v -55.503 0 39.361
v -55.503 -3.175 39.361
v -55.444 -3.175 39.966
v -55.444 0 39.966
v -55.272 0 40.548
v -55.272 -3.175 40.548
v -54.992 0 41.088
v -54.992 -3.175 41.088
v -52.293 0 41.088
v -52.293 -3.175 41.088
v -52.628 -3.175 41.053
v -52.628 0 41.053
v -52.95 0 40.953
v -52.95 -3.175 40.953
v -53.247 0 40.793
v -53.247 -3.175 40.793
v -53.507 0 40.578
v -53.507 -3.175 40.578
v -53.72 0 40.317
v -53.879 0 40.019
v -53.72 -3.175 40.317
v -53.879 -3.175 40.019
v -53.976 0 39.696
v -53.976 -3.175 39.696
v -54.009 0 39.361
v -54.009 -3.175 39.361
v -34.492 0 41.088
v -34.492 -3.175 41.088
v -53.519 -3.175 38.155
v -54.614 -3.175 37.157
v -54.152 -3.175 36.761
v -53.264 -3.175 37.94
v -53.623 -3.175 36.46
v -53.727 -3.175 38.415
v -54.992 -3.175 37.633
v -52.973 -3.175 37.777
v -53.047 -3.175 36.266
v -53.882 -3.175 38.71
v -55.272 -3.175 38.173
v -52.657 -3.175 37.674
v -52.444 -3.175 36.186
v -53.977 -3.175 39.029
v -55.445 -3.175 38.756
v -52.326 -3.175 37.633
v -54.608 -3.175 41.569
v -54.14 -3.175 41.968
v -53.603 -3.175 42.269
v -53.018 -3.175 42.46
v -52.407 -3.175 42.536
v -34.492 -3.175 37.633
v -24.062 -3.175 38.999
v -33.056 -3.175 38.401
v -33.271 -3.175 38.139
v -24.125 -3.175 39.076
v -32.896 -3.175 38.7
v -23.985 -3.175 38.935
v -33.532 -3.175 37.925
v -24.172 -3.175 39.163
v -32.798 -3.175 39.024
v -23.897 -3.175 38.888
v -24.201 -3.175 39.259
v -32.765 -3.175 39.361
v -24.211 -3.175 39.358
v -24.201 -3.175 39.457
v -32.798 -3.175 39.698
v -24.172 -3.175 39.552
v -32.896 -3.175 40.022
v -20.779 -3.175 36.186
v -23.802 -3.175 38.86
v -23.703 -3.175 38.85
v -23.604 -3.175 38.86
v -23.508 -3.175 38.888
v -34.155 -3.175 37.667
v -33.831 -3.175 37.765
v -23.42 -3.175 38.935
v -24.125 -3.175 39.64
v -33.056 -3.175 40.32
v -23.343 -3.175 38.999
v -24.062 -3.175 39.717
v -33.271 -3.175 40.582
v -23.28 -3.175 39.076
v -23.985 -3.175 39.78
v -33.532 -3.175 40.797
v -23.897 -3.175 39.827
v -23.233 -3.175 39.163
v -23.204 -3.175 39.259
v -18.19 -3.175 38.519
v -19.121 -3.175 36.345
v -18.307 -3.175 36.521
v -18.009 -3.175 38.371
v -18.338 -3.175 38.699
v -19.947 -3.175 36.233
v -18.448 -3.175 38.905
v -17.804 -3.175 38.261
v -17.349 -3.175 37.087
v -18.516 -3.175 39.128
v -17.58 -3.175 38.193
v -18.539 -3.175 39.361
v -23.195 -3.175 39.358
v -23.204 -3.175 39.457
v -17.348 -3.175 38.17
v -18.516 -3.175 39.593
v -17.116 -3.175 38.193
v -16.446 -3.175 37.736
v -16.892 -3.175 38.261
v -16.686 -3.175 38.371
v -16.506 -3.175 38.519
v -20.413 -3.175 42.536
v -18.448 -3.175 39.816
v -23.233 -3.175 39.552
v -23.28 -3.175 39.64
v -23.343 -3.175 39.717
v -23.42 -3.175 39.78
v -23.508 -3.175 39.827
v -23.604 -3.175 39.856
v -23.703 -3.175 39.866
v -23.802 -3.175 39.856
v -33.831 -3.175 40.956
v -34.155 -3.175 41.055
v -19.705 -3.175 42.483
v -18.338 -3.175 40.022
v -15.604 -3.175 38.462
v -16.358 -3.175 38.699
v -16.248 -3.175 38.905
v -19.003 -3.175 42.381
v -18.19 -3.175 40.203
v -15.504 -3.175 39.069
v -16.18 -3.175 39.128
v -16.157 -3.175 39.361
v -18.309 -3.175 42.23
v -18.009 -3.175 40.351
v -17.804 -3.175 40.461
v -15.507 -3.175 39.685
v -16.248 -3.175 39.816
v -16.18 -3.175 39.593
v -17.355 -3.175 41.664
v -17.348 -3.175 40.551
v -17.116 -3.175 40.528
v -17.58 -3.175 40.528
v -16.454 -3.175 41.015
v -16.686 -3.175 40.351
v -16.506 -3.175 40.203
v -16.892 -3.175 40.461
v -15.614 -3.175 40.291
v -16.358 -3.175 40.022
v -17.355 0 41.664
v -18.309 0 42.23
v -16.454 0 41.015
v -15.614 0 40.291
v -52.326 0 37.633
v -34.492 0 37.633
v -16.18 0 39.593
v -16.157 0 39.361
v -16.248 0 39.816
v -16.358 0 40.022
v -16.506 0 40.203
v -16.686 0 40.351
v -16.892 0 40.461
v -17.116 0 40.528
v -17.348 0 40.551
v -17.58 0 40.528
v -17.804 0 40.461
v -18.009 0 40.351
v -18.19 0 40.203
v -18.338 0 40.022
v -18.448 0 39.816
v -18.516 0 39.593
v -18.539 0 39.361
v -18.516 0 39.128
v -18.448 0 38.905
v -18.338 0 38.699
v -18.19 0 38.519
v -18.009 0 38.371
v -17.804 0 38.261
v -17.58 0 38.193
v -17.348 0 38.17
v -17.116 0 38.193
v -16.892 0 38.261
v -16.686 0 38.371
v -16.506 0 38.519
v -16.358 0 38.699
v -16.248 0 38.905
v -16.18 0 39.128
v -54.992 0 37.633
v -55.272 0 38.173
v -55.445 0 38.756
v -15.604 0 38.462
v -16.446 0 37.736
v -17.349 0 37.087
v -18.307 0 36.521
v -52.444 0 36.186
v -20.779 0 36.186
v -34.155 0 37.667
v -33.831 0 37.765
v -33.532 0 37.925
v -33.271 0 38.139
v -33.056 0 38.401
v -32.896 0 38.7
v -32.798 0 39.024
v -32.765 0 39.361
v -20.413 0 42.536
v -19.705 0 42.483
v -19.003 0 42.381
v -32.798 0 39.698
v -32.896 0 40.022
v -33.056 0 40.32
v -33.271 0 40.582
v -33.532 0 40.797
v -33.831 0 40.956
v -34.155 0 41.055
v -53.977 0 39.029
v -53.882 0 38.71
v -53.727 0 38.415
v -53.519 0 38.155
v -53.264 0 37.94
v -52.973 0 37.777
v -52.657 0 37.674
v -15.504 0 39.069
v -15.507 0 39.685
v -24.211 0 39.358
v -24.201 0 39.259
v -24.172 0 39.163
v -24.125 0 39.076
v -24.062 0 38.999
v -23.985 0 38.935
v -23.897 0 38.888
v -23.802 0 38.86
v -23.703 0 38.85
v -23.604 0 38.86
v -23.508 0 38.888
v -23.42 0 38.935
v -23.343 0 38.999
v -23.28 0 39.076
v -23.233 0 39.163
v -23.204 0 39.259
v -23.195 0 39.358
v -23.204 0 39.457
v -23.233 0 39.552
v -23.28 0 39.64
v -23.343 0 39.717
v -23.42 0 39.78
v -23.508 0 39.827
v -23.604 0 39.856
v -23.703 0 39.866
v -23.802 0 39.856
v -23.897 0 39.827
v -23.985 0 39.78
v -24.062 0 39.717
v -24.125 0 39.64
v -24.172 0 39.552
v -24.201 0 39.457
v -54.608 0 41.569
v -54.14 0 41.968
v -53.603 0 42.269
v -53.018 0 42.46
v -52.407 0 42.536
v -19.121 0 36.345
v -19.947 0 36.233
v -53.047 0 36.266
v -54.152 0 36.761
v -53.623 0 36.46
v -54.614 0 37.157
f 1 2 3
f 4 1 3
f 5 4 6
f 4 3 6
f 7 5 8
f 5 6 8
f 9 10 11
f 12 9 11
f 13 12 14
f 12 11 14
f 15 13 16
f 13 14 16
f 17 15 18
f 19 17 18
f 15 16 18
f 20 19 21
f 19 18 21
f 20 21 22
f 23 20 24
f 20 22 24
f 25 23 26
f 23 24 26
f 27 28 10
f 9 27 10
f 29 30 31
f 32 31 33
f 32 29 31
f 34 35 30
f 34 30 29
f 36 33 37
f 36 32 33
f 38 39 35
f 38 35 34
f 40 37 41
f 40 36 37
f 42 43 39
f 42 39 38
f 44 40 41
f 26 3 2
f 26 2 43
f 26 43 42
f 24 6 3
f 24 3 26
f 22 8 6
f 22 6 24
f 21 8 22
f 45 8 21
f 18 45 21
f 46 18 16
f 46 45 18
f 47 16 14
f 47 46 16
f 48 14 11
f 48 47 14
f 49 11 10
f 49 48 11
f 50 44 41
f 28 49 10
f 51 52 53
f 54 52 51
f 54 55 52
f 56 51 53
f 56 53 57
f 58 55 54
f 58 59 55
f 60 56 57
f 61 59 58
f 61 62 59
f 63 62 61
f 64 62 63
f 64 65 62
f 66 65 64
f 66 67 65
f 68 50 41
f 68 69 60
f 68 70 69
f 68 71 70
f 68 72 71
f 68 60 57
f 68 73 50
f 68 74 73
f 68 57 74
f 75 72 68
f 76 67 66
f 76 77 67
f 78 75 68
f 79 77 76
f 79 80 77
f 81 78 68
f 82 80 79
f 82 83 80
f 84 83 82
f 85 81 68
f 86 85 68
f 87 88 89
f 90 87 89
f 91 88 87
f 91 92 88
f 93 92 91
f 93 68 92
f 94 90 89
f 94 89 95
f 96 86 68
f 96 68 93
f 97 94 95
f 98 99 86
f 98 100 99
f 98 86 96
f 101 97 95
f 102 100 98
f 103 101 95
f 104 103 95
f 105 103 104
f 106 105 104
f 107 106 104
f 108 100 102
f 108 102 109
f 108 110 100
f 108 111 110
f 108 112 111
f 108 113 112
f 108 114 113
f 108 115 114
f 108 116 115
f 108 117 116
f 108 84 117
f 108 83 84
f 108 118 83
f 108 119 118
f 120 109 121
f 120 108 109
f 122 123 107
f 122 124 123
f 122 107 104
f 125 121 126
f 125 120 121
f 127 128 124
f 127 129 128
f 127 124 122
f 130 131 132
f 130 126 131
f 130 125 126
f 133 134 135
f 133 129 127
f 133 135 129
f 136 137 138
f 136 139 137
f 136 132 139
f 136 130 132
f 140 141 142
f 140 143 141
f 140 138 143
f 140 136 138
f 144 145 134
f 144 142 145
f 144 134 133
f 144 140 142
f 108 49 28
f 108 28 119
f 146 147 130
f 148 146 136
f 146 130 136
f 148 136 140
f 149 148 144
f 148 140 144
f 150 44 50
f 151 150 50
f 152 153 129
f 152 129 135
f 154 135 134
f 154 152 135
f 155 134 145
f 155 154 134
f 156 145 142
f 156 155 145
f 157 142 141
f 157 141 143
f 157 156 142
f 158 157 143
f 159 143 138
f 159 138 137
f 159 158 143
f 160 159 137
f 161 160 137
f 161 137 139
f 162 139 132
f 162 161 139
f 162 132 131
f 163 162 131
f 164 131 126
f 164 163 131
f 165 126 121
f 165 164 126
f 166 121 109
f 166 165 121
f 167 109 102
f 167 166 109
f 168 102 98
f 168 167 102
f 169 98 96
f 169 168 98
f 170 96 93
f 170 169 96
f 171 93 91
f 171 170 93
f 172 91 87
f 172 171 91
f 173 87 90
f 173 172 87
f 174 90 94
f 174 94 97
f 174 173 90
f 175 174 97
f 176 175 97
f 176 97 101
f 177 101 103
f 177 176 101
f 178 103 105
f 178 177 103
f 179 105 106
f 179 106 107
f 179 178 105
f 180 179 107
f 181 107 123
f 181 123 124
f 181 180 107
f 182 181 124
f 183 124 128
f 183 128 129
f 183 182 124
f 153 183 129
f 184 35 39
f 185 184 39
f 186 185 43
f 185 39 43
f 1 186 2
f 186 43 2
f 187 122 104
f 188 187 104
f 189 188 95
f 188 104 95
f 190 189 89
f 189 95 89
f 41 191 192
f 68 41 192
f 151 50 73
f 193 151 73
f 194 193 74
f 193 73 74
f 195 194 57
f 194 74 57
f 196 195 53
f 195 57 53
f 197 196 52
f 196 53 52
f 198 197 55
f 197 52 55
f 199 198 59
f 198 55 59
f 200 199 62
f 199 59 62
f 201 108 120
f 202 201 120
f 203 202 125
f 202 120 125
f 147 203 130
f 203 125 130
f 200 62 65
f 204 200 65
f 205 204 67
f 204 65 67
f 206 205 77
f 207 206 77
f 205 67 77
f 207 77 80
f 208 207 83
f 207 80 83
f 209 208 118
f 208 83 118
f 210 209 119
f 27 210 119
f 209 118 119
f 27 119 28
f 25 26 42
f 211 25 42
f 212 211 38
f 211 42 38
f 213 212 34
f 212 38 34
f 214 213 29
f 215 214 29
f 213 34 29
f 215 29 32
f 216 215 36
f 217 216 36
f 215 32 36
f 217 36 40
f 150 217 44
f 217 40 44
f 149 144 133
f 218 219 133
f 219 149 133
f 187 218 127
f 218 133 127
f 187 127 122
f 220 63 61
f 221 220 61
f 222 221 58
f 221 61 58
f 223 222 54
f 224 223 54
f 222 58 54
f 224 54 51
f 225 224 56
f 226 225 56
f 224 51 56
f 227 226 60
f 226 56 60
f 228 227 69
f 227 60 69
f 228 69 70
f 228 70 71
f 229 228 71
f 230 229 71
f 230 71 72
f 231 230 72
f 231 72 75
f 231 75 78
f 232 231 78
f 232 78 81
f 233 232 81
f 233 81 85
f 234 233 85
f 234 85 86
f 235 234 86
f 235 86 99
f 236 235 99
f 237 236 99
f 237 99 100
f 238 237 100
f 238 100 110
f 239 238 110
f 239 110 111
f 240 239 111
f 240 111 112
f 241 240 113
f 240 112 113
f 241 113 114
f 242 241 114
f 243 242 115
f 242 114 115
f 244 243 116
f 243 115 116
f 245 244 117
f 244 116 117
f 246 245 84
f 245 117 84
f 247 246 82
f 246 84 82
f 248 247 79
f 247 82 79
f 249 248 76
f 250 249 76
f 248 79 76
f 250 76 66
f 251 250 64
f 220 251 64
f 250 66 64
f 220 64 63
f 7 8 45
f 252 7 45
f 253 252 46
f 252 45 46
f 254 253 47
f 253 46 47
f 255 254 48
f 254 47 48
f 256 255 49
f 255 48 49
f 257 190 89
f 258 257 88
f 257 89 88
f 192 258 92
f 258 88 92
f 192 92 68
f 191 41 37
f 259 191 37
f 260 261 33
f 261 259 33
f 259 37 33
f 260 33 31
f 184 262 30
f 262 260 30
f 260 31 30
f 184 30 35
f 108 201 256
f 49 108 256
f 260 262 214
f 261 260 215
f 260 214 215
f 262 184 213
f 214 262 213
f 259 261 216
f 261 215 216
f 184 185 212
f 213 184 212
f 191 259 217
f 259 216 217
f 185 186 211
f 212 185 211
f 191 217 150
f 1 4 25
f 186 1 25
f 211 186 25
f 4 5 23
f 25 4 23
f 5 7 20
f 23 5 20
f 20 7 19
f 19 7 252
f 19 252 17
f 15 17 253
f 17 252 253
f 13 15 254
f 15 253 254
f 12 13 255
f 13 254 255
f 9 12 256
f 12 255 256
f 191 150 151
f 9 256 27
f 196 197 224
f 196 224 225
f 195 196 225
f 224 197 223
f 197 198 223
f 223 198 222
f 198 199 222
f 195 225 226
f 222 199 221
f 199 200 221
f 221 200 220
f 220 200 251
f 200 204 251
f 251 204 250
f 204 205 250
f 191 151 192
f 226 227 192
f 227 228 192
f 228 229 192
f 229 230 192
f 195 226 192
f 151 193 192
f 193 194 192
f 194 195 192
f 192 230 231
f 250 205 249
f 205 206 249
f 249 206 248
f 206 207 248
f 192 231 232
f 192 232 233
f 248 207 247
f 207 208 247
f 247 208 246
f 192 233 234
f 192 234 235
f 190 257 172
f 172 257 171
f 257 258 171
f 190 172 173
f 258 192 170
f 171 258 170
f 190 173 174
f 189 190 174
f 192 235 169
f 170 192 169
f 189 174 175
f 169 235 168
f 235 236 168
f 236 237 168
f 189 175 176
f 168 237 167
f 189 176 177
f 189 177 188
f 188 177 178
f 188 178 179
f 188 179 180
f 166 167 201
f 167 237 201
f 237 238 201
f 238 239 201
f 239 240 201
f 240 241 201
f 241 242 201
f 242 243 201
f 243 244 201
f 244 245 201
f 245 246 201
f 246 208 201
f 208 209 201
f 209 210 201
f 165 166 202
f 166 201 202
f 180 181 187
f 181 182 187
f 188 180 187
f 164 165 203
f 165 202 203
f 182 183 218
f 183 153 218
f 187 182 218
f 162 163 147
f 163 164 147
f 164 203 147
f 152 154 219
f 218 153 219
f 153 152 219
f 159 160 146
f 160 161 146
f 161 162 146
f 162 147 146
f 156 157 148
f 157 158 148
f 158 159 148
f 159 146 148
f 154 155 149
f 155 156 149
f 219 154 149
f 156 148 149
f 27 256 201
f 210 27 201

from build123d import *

# Parameters (mm, degrees)
F0_R     = 1.5875
F0_R_2   = 1.190625
F1_DEPTH = 3.175
F3_DEPTH = 25.4
F4_DEPTH = 25.4
F5_DEPTH = 25.4
F6_DEPTH = 25.4
F8_DEPTH = 25.4
F9_DEPTH = 21.59
F11_D    = 1.016


with BuildPart() as f1:
    # F0 (on Front) → F1 (new body)
    with BuildSketch(Plane.XZ):
        with BuildLine():
            Line((-59.9854774773, 36.1856259406), (-16.1655526608, 36.1856259406))
            Line((-16.1655526608, 36.1856259406), (-14.5380130693, 39.3606259406))
            Line((-14.5380130693, 39.3606259406), (-16.1655526608, 42.5356259406))
            Line((-16.1655526608, 42.5356259406), (-59.9854774773, 42.5356259406))
            ThreePointArc((-59.9854774773, 42.5356259406), (-63.0682841445, 39.3606259406), (-59.9854774773, 36.1856259406))
        make_face()
        with Locations((-17.3478871584, 39.3606259406)):
            Circle(F0_R, mode=Mode.SUBTRACT)
        with Locations((-17.3478871584, 39.3606259406)):
            Circle(F0_R)
        with Locations((-17.3478871584, 39.3606259406)):
            Circle(F0_R_2, mode=Mode.SUBTRACT)
    extrude(amount=F1_DEPTH)

    # F2 (on face) → F3 (cut)
    with BuildSketch(Plane.XZ.offset(3.175)):
        with BuildLine():
            ThreePointArc((-15.3748723059, 37.758994363), (-16.1969030784, 36.7786361584), (-17.3305589706, 36.1856259406))
            Line((-17.3305589706, 36.1856259406), (-16.1655526608, 36.1856259406))
            Line((-16.1655526608, 36.1856259406), (-15.3517828651, 37.7731259406))
            ThreePointArc((-15.3517828651, 37.7731259406), (-15.3633231409, 37.7660528898), (-15.3748723059, 37.758994363))
        make_face()
        with BuildLine():
            ThreePointArc((-15.404339903, 40.9815081352), (-14.9683940419, 39.3741029339), (-15.3748723059, 37.758994363))
            ThreePointArc((-15.3748723059, 37.758994363), (-15.3633231409, 37.7660528898), (-15.3517828651, 37.7731259406))
            Line((-15.3517828651, 37.7731259406), (-14.5380130693, 39.3606259406))
            Line((-14.5380130693, 39.3606259406), (-15.3517828651, 40.9481259406))
            ThreePointArc((-15.3517828651, 40.9481259406), (-15.3780357265, 40.9648574331), (-15.404339903, 40.9815081352))
        make_face()
        with BuildLine():
            ThreePointArc((-17.4520071596, 42.5356259406), (-16.2702339986, 41.9666642674), (-15.404339903, 40.9815081352))
            ThreePointArc((-15.404339903, 40.9815081352), (-15.3780357265, 40.9648574331), (-15.3517828651, 40.9481259406))
            Line((-15.3517828651, 40.9481259406), (-16.1655526608, 42.5356259406))
            Line((-16.1655526608, 42.5356259406), (-17.4520071596, 42.5356259406))
        make_face()
    extrude(amount=-F3_DEPTH, mode=Mode.SUBTRACT)

    # F2 (on face) → F4 (cut)
    with BuildSketch(Plane.XZ.offset(3.175)):
        with BuildLine():
            ThreePointArc((-20.4132606166, 42.5356259406), (-17.8064403349, 42.0884730118), (-15.404339903, 40.9815081352))
            ThreePointArc((-15.404339903, 40.9815081352), (-16.2702339986, 41.9666642674), (-17.4520071596, 42.5356259406))
            Line((-17.4520071596, 42.5356259406), (-20.4132606166, 42.5356259406))
        make_face()
        with BuildLine():
            ThreePointArc((-15.404339903, 40.9815081352), (-14.9683940419, 39.3741029339), (-15.3748723059, 37.758994363))
            ThreePointArc((-15.3748723059, 37.758994363), (-15.3633231409, 37.7660528898), (-15.3517828651, 37.7731259406))
            Line((-15.3517828651, 37.7731259406), (-14.5380130693, 39.3606259406))
            Line((-14.5380130693, 39.3606259406), (-15.3517828651, 40.9481259406))
            ThreePointArc((-15.3517828651, 40.9481259406), (-15.3780357265, 40.9648574331), (-15.404339903, 40.9815081352))
        make_face()
        with BuildLine():
            Line((-20.778906084, 36.1856259406), (-17.3305589706, 36.1856259406))
            ThreePointArc((-17.3305589706, 36.1856259406), (-16.1969030784, 36.7786361584), (-15.3748723059, 37.758994363))
            ThreePointArc((-15.3748723059, 37.758994363), (-17.9721795073, 36.6126647687), (-20.778906084, 36.1856259406))
        make_face()
    extrude(amount=-F4_DEPTH, mode=Mode.SUBTRACT)

    # F2 (on face) → F5 (cut)
    with BuildSketch(Plane.XZ.offset(3.175)):
        with BuildLine():
            Line((-59.9854774773, 36.1856259406), (-52.4438694119, 36.1856259406))
            ThreePointArc((-52.4438694119, 36.1856259406), (-53.8950663244, 36.5980321526), (-54.9923407048, 37.6334259406))
            Line((-54.9923407048, 37.6334259406), (-59.8919055938, 37.6334259406))
            ThreePointArc((-59.8919055938, 37.6334259406), (-61.6191055938, 39.3606259406), (-59.8919055938, 41.0878259406))
            Line((-59.8919055938, 41.0878259406), (-54.9915987334, 41.0878259406))
            ThreePointArc((-54.9915987334, 41.0878259406), (-53.878578845, 42.1313762088), (-52.4073913693, 42.5356259406))
            Line((-52.4073913693, 42.5356259406), (-59.9854774773, 42.5356259406))
            ThreePointArc((-59.9854774773, 42.5356259406), (-63.0682841445, 39.3606259406), (-59.9854774773, 36.1856259406))
        make_face()
        with BuildLine():
            Line((-58.1647055938, 39.3606259406), (-55.5025643281, 39.3606259406))
            ThreePointArc((-55.5025643281, 39.3606259406), (-55.372064535, 40.261200243), (-54.9915987334, 41.0878259406))
            Line((-54.9915987334, 41.0878259406), (-59.8919055938, 41.0878259406))
            ThreePointArc((-59.8919055938, 41.0878259406), (-58.6705907614, 40.581940773), (-58.1647055938, 39.3606259406))
        make_face()
        with BuildLine():
            Line((-59.8919055938, 37.6334259406), (-54.9923407048, 37.6334259406))
            ThreePointArc((-54.9923407048, 37.6334259406), (-55.3724203009, 38.4601098244), (-55.5025643281, 39.3606259406))
            Line((-55.5025643281, 39.3606259406), (-58.1647055938, 39.3606259406))
            ThreePointArc((-58.1647055938, 39.3606259406), (-58.6705907614, 38.1393111081), (-59.8919055938, 37.6334259406))
        make_face()
        with BuildLine():
            ThreePointArc((-59.8919055938, 41.0878259406), (-61.6191055938, 39.3606259406), (-59.8919055938, 37.6334259406))
            ThreePointArc((-59.8919055938, 37.6334259406), (-58.6705907614, 38.1393111081), (-58.1647055938, 39.3606259406))
            ThreePointArc((-58.1647055938, 39.3606259406), (-58.6705907614, 40.581940773), (-59.8919055938, 41.0878259406))
        make_face()
    extrude(amount=-F5_DEPTH, mode=Mode.SUBTRACT)

    # F2 (on face) → F6 (cut)
    with BuildSketch(Plane.XZ.offset(3.175)):
        with BuildLine():
            ThreePointArc((-52.2927604616, 41.0878259406), (-53.5069291888, 40.578005841), (-54.0090331721, 39.3606259406))
            Line((-54.0090331721, 39.3606259406), (-36.2191055938, 39.3606259406))
            ThreePointArc((-36.2191055938, 39.3606259406), (-35.7132204263, 40.581940773), (-34.4919055938, 41.0878259406))
            Line((-34.4919055938, 41.0878259406), (-52.2927604616, 41.0878259406))
        make_face()
        with BuildLine():
            ThreePointArc((-54.0090331721, 39.3606259406), (-53.5187568392, 38.1547311322), (-52.3259475214, 37.6334259406))
            Line((-52.3259475214, 37.6334259406), (-34.4919055938, 37.6334259406))
            ThreePointArc((-34.4919055938, 37.6334259406), (-35.7132204263, 38.1393111081), (-36.2191055938, 39.3606259406))
            Line((-36.2191055938, 39.3606259406), (-54.0090331721, 39.3606259406))
        make_face()
        with BuildLine():
            ThreePointArc((-34.4919055938, 41.0878259406), (-35.7132204263, 40.581940773), (-36.2191055938, 39.3606259406))
            Line((-36.2191055938, 39.3606259406), (-34.4919055938, 39.3606259406))
            Line((-34.4919055938, 39.3606259406), (-34.4919055938, 41.0878259406))
        make_face()
        with BuildLine():
            ThreePointArc((-36.2191055938, 39.3606259406), (-35.7132204263, 38.1393111081), (-34.4919055938, 37.6334259406))
            Line((-34.4919055938, 37.6334259406), (-34.4919055938, 39.3606259406))
            Line((-34.4919055938, 39.3606259406), (-36.2191055938, 39.3606259406))
        make_face()
        with BuildLine():
            Line((-34.4919055938, 39.3606259406), (-34.4919055938, 37.6334259406))
            ThreePointArc((-34.4919055938, 37.6334259406), (-33.2705907614, 38.1393111081), (-32.7647055938, 39.3606259406))
            ThreePointArc((-32.7647055938, 39.3606259406), (-33.2705907614, 40.581940773), (-34.4919055938, 41.0878259406))
            Line((-34.4919055938, 41.0878259406), (-34.4919055938, 39.3606259406))
        make_face()
    extrude(amount=-F6_DEPTH, mode=Mode.SUBTRACT)

    # F7 (on face) → F8 (cut)
    with BuildSketch(Plane.XZ.offset(3.175)):
        with BuildLine():
            ThreePointArc((-15.6042189064, 38.4623412006), (-15.8016195139, 37.8900751539), (-16.0912083493, 37.3584796926))
            ThreePointArc((-16.0912083493, 37.3584796926), (-15.7292199643, 37.5519041597), (-15.3748723059, 37.758994363))
            ThreePointArc((-15.3748723059, 37.758994363), (-15.1042820518, 38.4073926685), (-14.9774259999, 39.0984404167))
            ThreePointArc((-14.9774259999, 39.0984404167), (-15.285118653, 38.7747704567), (-15.6042189064, 38.4623412006))
        make_face()
        with BuildLine():
            ThreePointArc((-15.6138083064, 40.2906739685), (-15.4922450078, 39.3771200227), (-15.6042189064, 38.4623412006))
            ThreePointArc((-15.6042189064, 38.4623412006), (-15.285118653, 38.7747704567), (-14.9774259999, 39.0984404167))
            ThreePointArc((-14.9774259999, 39.0984404167), (-14.9684104497, 39.3758467508), (-14.9827910636, 39.6530267506))
            ThreePointArc((-14.9827910636, 39.6530267506), (-15.2926534564, 39.9774378811), (-15.6138083064, 40.2906739685))
        make_face()
        with BuildLine():
            ThreePointArc((-16.1121669082, 41.3890946918), (-15.8171331409, 40.8606887152), (-15.6138083064, 40.2906739685))
            ThreePointArc((-15.6138083064, 40.2906739685), (-15.2926534564, 39.9774378811), (-14.9827910636, 39.6530267506))
            ThreePointArc((-14.9827910636, 39.6530267506), (-15.1224646144, 40.3398289098), (-15.404339903, 40.9815081352))
            ThreePointArc((-15.404339903, 40.9815081352), (-15.7541421045, 41.1924412219), (-16.1121669082, 41.3890946918))
        make_face()
    extrude(amount=-F8_DEPTH, mode=Mode.SUBTRACT)

    # F7 (on face) → F9 (cut)
    with BuildSketch(Plane.XZ.offset(3.175)):
        with BuildLine():
            ThreePointArc((-18.3094374963, 42.23041588), (-16.8977827327, 41.3492626146), (-15.6138083064, 40.2906739685))
            ThreePointArc((-15.6138083064, 40.2906739685), (-15.8171331409, 40.8606887152), (-16.1121669082, 41.3890946918))
            ThreePointArc((-16.1121669082, 41.3890946918), (-17.1862834694, 41.8737906284), (-18.3094374963, 42.23041588))
        make_face()
        with BuildLine():
            ThreePointArc((-18.3068840907, 36.5210452642), (-17.1759299722, 36.8786017382), (-16.0912083493, 37.3584796926))
            ThreePointArc((-16.0912083493, 37.3584796926), (-15.8016195139, 37.8900751539), (-15.6042189064, 38.4623412006))
            ThreePointArc((-15.6042189064, 38.4623412006), (-16.8904167196, 37.4010128286), (-18.3068840907, 36.5210452642))
        make_face()
    extrude(amount=-F9_DEPTH, mode=Mode.SUBTRACT)

    # F11 (through all)
    with Locations(Plane(origin=(0, 0, 0), x_dir=(1, 0, 0), z_dir=(0, 1, 0))):
        with Locations((-23.7026810646, -39.3577963114)):
            Hole(F11_D / 2)


solid = f1.part
